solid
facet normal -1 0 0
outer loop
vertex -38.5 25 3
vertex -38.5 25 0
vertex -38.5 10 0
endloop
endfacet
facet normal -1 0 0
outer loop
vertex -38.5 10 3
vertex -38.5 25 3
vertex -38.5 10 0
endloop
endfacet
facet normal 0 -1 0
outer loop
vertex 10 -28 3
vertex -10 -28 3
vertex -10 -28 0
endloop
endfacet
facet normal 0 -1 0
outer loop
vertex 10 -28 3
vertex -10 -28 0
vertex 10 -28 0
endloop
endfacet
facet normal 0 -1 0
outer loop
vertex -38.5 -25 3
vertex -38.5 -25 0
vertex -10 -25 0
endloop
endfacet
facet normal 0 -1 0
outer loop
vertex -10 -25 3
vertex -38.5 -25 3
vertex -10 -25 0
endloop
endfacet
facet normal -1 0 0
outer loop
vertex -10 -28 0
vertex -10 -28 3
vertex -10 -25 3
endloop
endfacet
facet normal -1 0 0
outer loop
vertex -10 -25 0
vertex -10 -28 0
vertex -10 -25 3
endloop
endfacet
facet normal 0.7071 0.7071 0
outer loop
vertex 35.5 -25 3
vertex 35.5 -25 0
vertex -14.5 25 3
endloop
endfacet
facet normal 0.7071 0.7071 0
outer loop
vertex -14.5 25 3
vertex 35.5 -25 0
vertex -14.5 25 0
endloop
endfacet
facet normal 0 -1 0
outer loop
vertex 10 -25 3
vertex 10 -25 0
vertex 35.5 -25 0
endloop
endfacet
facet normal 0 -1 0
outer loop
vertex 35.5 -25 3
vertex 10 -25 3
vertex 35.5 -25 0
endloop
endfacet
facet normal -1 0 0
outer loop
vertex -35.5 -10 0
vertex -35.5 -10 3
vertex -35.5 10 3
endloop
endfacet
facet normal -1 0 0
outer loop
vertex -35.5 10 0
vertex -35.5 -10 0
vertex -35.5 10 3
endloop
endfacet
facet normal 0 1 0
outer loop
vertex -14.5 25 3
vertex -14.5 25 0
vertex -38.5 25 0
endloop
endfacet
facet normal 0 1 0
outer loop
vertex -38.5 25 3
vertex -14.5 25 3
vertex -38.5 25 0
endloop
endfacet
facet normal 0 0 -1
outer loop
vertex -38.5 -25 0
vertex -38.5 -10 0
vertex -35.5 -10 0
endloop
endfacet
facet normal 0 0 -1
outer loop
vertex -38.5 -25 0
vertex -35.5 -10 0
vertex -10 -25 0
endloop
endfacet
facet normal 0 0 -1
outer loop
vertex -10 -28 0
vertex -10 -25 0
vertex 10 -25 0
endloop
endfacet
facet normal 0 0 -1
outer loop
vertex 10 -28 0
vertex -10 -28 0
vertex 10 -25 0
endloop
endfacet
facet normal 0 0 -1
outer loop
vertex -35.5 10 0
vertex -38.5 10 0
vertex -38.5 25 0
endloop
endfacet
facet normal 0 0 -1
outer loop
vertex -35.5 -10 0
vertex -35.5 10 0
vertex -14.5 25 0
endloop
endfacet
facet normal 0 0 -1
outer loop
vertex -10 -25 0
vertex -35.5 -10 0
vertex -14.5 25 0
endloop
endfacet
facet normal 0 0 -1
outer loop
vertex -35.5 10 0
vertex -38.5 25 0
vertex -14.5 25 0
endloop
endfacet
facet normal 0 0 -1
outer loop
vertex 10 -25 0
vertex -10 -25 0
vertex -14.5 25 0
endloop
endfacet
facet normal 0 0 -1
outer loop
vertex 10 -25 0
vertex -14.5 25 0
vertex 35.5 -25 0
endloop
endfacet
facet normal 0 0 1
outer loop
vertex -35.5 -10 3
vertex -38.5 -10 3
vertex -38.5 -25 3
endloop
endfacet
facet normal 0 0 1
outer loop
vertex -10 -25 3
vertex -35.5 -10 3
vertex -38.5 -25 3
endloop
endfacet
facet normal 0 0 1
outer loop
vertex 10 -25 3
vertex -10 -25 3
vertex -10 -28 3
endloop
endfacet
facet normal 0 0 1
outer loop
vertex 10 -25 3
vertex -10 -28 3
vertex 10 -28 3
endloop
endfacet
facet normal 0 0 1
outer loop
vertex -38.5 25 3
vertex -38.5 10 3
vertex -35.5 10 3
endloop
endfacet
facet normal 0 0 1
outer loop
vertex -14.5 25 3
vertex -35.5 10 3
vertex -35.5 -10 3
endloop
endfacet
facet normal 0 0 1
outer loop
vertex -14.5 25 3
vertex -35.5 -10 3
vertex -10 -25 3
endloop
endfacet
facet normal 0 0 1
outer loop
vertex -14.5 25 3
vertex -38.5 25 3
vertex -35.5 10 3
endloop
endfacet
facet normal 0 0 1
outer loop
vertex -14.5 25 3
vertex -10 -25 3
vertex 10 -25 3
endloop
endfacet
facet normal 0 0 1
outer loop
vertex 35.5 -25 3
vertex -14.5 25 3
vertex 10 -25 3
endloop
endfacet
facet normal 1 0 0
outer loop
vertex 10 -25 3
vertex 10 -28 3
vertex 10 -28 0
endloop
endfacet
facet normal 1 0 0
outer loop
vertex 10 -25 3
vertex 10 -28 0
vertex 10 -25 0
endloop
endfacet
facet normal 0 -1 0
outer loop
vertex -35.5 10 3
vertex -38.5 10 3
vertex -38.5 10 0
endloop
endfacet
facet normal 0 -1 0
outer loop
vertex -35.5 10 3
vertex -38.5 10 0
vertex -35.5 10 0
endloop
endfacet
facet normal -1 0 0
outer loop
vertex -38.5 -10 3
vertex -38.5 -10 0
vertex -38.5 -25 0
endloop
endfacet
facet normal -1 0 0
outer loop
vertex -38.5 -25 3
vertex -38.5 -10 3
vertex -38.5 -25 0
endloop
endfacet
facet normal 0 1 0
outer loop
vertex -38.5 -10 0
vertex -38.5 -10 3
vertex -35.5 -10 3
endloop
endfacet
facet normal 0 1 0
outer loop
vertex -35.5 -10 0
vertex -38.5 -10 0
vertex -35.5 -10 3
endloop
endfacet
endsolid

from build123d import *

# Parameters (mm, degrees)
SALIENTE_EXTRUIR1_DEPTH = 3
CROQUIS4_W              = 20
CROQUIS4_H              = 3
SALIENTE_EXTRUIR3_DEPTH = 3
CROQUIS5_W              = 3
CROQUIS5_H              = 20
CORTAR_EXTRUIR1_DEPTH   = 3


with BuildPart() as part:
    # Croquis1 → Saliente-Extruir1 (new body)
    with BuildSketch(Plane.XY):
        Polygon((35.5, -25), (-14.5, 25), (-38.5, 25), (-38.5, -25), align=None)
    extrude(amount=SALIENTE_EXTRUIR1_DEPTH)

    # Croquis4 → Saliente-Extruir3 (add)
    with BuildSketch(Plane.XY.offset(3)):
        with Locations((0, -26.5)):
            Rectangle(CROQUIS4_W, CROQUIS4_H)
    extrude(amount=-SALIENTE_EXTRUIR3_DEPTH)

    # Croquis5 → Cortar-Extruir1 (cut)
    with BuildSketch(Plane.XY.offset(3)):
        with Locations((-37, 0)):
            Rectangle(CROQUIS5_W, CROQUIS5_H)
    extrude(amount=-CORTAR_EXTRUIR1_DEPTH, mode=Mode.SUBTRACT)


solid = part.part
